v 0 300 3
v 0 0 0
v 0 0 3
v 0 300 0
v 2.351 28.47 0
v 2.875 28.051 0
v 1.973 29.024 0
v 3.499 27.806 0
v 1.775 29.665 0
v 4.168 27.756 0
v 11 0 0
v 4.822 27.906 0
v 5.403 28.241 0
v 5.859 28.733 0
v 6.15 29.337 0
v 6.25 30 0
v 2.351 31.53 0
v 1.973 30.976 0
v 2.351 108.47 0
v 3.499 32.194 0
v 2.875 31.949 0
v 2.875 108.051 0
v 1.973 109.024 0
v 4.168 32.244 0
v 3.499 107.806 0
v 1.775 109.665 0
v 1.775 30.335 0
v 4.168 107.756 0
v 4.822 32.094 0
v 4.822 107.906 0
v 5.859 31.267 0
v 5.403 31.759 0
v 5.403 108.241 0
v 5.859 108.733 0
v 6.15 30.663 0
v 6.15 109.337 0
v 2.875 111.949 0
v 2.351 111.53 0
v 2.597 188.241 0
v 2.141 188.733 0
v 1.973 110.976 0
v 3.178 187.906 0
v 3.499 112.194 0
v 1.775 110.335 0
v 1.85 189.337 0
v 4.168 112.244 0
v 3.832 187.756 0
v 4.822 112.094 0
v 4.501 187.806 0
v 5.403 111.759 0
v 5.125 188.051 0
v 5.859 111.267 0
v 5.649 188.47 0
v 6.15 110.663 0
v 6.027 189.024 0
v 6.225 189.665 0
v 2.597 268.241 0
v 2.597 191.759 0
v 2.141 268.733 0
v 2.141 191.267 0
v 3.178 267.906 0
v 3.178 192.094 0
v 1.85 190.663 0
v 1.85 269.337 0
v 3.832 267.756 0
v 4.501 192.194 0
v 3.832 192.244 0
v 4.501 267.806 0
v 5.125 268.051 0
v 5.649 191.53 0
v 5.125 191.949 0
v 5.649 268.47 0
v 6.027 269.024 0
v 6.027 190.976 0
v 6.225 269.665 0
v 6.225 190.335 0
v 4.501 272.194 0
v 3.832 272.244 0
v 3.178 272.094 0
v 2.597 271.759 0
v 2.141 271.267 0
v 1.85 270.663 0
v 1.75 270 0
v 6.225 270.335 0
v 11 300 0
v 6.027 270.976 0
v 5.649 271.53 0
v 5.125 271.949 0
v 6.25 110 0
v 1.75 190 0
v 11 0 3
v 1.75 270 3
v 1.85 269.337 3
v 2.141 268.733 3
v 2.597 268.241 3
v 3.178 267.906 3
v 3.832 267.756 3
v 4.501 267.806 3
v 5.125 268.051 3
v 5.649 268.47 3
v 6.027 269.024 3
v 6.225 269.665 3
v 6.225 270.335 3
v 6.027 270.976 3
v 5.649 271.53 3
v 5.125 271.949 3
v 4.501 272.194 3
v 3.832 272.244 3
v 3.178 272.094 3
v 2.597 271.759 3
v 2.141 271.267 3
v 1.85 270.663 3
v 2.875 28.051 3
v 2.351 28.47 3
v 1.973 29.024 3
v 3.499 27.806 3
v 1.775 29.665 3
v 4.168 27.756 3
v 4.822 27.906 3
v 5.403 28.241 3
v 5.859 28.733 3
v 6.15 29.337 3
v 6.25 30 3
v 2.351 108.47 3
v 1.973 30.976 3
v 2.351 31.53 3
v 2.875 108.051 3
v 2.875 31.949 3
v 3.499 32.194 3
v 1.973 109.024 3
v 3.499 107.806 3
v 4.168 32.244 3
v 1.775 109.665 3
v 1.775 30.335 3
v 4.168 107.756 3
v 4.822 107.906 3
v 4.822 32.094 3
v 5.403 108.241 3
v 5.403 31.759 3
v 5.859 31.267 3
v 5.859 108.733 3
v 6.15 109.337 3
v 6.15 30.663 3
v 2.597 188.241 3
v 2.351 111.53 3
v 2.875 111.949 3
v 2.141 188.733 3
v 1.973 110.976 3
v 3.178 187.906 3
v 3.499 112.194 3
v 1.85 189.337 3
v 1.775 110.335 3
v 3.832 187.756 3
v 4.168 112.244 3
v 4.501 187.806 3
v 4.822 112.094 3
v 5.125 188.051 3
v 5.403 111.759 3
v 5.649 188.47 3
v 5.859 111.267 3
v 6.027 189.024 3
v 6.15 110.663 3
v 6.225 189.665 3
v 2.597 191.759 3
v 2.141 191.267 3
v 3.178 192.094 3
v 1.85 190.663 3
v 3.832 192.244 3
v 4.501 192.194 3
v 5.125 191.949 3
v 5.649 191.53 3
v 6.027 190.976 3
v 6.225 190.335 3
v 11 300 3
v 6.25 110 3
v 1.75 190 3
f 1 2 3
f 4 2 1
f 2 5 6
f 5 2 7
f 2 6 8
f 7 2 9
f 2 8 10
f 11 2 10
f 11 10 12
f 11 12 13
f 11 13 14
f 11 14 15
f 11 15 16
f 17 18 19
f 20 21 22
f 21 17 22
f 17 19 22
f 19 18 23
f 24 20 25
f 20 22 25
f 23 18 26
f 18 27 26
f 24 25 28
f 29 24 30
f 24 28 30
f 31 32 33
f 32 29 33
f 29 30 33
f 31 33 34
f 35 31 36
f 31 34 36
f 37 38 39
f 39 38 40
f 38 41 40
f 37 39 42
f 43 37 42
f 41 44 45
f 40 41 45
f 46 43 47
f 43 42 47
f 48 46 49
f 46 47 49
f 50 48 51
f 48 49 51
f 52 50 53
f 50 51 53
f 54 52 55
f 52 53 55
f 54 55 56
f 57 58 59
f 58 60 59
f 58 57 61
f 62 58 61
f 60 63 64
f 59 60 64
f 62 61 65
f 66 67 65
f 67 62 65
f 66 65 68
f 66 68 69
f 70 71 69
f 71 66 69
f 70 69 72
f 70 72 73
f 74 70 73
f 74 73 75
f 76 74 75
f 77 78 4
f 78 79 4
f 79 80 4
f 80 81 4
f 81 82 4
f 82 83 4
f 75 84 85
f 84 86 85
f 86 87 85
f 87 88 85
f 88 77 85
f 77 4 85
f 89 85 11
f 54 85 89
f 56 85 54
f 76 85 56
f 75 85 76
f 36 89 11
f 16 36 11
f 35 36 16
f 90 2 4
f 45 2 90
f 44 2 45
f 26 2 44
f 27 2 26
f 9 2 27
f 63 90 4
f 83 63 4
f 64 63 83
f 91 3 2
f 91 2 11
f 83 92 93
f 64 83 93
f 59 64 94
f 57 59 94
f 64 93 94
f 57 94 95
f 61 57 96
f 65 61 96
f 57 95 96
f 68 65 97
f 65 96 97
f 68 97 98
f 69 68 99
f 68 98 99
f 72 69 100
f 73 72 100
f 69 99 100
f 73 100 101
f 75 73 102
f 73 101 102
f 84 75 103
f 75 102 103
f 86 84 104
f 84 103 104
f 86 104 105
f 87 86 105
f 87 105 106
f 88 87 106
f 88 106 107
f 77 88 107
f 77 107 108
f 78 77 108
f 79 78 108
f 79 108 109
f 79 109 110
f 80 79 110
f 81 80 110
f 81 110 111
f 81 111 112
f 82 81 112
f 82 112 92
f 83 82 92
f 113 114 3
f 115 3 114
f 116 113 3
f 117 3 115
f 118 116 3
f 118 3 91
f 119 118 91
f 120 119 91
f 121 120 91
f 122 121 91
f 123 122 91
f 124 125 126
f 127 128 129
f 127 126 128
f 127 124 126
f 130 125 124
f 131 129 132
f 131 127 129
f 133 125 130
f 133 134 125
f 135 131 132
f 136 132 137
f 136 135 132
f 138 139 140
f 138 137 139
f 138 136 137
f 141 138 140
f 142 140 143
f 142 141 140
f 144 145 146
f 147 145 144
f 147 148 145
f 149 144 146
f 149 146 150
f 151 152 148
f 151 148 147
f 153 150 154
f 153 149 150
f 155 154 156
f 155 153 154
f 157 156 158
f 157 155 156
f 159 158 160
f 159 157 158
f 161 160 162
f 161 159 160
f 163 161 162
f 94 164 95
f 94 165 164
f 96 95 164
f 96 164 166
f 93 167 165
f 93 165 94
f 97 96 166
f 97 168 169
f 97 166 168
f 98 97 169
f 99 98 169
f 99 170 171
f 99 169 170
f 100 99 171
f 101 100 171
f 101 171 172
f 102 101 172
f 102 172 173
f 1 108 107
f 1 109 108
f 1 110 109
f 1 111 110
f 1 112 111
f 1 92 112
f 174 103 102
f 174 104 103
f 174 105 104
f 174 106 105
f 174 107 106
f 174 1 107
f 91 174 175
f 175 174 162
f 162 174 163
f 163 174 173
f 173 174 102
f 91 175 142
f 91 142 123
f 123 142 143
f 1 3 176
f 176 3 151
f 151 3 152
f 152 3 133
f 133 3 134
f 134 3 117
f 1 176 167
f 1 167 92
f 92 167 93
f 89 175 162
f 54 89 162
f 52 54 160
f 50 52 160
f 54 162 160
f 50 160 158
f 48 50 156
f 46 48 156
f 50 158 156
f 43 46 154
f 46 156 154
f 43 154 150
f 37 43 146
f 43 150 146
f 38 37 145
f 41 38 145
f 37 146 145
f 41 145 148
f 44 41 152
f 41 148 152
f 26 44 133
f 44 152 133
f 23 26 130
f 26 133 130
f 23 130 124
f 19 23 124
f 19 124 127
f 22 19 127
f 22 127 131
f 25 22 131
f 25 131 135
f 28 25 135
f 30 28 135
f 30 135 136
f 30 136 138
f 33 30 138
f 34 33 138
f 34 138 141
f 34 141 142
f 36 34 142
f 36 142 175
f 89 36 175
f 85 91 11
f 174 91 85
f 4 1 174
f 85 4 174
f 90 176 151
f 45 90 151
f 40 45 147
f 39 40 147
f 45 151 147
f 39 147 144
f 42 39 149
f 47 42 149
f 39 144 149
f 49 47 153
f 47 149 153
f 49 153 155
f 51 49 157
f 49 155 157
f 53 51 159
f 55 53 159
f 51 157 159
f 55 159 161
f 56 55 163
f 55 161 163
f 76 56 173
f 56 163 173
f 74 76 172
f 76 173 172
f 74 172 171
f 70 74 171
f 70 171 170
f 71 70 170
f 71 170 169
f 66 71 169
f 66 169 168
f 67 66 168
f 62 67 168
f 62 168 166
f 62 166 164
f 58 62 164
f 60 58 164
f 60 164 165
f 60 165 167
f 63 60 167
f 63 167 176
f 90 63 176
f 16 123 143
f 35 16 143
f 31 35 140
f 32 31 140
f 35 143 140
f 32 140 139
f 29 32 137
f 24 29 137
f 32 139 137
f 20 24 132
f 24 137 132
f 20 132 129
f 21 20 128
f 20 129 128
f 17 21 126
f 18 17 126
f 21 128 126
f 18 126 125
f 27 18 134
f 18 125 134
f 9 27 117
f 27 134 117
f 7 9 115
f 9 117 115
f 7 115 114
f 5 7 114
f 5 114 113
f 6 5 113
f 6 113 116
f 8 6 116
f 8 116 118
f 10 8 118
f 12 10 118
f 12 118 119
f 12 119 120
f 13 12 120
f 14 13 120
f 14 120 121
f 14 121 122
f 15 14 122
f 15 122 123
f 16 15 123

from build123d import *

# Parameters (mm, degrees)
ESQUISSE1_W             = 8
ESQUISSE1_H             = 300
BOSS_EXTRU_1_DEPTH      = 3
ESQUISSE2_R             = 2.25
ENL_V_MAT_EXTRU_1_DEPTH = 301.121642005
ESQUISSE4_W             = 3
ESQUISSE4_H             = 300
BOSS_EXTRU_2_DEPTH      = 3


with BuildPart() as part:
    # Esquisse1 → Boss.-Extru.1 (new body)
    with BuildSketch(Plane.XY):
        with Locations((4, 150)):
            Rectangle(ESQUISSE1_W, ESQUISSE1_H)
    extrude(amount=BOSS_EXTRU_1_DEPTH)

    # Esquisse2 → Enlèv. mat.-Extru.1 (cut, through all)
    with BuildSketch(Plane.XY.offset(3)):
        with Locations((4, 110)):
            Circle(ESQUISSE2_R)
        with Locations((4, 30)):
            Circle(ESQUISSE2_R)
        with Locations(Location((4, 270, 0), (0, 0, 180))):
            Circle(ESQUISSE2_R)
        with Locations(Location((4, 190, 0), (0, 0, 180))):
            Circle(ESQUISSE2_R)
    extrude(amount=-ENL_V_MAT_EXTRU_1_DEPTH, mode=Mode.SUBTRACT)

    # Esquisse4 → Boss.-Extru.2 (add)
    with BuildSketch(Plane.XY.offset(3)):
        with Locations((9.5, 150)):
            Rectangle(ESQUISSE4_W, ESQUISSE4_H)
    extrude(amount=-BOSS_EXTRU_2_DEPTH)


solid = part.part
